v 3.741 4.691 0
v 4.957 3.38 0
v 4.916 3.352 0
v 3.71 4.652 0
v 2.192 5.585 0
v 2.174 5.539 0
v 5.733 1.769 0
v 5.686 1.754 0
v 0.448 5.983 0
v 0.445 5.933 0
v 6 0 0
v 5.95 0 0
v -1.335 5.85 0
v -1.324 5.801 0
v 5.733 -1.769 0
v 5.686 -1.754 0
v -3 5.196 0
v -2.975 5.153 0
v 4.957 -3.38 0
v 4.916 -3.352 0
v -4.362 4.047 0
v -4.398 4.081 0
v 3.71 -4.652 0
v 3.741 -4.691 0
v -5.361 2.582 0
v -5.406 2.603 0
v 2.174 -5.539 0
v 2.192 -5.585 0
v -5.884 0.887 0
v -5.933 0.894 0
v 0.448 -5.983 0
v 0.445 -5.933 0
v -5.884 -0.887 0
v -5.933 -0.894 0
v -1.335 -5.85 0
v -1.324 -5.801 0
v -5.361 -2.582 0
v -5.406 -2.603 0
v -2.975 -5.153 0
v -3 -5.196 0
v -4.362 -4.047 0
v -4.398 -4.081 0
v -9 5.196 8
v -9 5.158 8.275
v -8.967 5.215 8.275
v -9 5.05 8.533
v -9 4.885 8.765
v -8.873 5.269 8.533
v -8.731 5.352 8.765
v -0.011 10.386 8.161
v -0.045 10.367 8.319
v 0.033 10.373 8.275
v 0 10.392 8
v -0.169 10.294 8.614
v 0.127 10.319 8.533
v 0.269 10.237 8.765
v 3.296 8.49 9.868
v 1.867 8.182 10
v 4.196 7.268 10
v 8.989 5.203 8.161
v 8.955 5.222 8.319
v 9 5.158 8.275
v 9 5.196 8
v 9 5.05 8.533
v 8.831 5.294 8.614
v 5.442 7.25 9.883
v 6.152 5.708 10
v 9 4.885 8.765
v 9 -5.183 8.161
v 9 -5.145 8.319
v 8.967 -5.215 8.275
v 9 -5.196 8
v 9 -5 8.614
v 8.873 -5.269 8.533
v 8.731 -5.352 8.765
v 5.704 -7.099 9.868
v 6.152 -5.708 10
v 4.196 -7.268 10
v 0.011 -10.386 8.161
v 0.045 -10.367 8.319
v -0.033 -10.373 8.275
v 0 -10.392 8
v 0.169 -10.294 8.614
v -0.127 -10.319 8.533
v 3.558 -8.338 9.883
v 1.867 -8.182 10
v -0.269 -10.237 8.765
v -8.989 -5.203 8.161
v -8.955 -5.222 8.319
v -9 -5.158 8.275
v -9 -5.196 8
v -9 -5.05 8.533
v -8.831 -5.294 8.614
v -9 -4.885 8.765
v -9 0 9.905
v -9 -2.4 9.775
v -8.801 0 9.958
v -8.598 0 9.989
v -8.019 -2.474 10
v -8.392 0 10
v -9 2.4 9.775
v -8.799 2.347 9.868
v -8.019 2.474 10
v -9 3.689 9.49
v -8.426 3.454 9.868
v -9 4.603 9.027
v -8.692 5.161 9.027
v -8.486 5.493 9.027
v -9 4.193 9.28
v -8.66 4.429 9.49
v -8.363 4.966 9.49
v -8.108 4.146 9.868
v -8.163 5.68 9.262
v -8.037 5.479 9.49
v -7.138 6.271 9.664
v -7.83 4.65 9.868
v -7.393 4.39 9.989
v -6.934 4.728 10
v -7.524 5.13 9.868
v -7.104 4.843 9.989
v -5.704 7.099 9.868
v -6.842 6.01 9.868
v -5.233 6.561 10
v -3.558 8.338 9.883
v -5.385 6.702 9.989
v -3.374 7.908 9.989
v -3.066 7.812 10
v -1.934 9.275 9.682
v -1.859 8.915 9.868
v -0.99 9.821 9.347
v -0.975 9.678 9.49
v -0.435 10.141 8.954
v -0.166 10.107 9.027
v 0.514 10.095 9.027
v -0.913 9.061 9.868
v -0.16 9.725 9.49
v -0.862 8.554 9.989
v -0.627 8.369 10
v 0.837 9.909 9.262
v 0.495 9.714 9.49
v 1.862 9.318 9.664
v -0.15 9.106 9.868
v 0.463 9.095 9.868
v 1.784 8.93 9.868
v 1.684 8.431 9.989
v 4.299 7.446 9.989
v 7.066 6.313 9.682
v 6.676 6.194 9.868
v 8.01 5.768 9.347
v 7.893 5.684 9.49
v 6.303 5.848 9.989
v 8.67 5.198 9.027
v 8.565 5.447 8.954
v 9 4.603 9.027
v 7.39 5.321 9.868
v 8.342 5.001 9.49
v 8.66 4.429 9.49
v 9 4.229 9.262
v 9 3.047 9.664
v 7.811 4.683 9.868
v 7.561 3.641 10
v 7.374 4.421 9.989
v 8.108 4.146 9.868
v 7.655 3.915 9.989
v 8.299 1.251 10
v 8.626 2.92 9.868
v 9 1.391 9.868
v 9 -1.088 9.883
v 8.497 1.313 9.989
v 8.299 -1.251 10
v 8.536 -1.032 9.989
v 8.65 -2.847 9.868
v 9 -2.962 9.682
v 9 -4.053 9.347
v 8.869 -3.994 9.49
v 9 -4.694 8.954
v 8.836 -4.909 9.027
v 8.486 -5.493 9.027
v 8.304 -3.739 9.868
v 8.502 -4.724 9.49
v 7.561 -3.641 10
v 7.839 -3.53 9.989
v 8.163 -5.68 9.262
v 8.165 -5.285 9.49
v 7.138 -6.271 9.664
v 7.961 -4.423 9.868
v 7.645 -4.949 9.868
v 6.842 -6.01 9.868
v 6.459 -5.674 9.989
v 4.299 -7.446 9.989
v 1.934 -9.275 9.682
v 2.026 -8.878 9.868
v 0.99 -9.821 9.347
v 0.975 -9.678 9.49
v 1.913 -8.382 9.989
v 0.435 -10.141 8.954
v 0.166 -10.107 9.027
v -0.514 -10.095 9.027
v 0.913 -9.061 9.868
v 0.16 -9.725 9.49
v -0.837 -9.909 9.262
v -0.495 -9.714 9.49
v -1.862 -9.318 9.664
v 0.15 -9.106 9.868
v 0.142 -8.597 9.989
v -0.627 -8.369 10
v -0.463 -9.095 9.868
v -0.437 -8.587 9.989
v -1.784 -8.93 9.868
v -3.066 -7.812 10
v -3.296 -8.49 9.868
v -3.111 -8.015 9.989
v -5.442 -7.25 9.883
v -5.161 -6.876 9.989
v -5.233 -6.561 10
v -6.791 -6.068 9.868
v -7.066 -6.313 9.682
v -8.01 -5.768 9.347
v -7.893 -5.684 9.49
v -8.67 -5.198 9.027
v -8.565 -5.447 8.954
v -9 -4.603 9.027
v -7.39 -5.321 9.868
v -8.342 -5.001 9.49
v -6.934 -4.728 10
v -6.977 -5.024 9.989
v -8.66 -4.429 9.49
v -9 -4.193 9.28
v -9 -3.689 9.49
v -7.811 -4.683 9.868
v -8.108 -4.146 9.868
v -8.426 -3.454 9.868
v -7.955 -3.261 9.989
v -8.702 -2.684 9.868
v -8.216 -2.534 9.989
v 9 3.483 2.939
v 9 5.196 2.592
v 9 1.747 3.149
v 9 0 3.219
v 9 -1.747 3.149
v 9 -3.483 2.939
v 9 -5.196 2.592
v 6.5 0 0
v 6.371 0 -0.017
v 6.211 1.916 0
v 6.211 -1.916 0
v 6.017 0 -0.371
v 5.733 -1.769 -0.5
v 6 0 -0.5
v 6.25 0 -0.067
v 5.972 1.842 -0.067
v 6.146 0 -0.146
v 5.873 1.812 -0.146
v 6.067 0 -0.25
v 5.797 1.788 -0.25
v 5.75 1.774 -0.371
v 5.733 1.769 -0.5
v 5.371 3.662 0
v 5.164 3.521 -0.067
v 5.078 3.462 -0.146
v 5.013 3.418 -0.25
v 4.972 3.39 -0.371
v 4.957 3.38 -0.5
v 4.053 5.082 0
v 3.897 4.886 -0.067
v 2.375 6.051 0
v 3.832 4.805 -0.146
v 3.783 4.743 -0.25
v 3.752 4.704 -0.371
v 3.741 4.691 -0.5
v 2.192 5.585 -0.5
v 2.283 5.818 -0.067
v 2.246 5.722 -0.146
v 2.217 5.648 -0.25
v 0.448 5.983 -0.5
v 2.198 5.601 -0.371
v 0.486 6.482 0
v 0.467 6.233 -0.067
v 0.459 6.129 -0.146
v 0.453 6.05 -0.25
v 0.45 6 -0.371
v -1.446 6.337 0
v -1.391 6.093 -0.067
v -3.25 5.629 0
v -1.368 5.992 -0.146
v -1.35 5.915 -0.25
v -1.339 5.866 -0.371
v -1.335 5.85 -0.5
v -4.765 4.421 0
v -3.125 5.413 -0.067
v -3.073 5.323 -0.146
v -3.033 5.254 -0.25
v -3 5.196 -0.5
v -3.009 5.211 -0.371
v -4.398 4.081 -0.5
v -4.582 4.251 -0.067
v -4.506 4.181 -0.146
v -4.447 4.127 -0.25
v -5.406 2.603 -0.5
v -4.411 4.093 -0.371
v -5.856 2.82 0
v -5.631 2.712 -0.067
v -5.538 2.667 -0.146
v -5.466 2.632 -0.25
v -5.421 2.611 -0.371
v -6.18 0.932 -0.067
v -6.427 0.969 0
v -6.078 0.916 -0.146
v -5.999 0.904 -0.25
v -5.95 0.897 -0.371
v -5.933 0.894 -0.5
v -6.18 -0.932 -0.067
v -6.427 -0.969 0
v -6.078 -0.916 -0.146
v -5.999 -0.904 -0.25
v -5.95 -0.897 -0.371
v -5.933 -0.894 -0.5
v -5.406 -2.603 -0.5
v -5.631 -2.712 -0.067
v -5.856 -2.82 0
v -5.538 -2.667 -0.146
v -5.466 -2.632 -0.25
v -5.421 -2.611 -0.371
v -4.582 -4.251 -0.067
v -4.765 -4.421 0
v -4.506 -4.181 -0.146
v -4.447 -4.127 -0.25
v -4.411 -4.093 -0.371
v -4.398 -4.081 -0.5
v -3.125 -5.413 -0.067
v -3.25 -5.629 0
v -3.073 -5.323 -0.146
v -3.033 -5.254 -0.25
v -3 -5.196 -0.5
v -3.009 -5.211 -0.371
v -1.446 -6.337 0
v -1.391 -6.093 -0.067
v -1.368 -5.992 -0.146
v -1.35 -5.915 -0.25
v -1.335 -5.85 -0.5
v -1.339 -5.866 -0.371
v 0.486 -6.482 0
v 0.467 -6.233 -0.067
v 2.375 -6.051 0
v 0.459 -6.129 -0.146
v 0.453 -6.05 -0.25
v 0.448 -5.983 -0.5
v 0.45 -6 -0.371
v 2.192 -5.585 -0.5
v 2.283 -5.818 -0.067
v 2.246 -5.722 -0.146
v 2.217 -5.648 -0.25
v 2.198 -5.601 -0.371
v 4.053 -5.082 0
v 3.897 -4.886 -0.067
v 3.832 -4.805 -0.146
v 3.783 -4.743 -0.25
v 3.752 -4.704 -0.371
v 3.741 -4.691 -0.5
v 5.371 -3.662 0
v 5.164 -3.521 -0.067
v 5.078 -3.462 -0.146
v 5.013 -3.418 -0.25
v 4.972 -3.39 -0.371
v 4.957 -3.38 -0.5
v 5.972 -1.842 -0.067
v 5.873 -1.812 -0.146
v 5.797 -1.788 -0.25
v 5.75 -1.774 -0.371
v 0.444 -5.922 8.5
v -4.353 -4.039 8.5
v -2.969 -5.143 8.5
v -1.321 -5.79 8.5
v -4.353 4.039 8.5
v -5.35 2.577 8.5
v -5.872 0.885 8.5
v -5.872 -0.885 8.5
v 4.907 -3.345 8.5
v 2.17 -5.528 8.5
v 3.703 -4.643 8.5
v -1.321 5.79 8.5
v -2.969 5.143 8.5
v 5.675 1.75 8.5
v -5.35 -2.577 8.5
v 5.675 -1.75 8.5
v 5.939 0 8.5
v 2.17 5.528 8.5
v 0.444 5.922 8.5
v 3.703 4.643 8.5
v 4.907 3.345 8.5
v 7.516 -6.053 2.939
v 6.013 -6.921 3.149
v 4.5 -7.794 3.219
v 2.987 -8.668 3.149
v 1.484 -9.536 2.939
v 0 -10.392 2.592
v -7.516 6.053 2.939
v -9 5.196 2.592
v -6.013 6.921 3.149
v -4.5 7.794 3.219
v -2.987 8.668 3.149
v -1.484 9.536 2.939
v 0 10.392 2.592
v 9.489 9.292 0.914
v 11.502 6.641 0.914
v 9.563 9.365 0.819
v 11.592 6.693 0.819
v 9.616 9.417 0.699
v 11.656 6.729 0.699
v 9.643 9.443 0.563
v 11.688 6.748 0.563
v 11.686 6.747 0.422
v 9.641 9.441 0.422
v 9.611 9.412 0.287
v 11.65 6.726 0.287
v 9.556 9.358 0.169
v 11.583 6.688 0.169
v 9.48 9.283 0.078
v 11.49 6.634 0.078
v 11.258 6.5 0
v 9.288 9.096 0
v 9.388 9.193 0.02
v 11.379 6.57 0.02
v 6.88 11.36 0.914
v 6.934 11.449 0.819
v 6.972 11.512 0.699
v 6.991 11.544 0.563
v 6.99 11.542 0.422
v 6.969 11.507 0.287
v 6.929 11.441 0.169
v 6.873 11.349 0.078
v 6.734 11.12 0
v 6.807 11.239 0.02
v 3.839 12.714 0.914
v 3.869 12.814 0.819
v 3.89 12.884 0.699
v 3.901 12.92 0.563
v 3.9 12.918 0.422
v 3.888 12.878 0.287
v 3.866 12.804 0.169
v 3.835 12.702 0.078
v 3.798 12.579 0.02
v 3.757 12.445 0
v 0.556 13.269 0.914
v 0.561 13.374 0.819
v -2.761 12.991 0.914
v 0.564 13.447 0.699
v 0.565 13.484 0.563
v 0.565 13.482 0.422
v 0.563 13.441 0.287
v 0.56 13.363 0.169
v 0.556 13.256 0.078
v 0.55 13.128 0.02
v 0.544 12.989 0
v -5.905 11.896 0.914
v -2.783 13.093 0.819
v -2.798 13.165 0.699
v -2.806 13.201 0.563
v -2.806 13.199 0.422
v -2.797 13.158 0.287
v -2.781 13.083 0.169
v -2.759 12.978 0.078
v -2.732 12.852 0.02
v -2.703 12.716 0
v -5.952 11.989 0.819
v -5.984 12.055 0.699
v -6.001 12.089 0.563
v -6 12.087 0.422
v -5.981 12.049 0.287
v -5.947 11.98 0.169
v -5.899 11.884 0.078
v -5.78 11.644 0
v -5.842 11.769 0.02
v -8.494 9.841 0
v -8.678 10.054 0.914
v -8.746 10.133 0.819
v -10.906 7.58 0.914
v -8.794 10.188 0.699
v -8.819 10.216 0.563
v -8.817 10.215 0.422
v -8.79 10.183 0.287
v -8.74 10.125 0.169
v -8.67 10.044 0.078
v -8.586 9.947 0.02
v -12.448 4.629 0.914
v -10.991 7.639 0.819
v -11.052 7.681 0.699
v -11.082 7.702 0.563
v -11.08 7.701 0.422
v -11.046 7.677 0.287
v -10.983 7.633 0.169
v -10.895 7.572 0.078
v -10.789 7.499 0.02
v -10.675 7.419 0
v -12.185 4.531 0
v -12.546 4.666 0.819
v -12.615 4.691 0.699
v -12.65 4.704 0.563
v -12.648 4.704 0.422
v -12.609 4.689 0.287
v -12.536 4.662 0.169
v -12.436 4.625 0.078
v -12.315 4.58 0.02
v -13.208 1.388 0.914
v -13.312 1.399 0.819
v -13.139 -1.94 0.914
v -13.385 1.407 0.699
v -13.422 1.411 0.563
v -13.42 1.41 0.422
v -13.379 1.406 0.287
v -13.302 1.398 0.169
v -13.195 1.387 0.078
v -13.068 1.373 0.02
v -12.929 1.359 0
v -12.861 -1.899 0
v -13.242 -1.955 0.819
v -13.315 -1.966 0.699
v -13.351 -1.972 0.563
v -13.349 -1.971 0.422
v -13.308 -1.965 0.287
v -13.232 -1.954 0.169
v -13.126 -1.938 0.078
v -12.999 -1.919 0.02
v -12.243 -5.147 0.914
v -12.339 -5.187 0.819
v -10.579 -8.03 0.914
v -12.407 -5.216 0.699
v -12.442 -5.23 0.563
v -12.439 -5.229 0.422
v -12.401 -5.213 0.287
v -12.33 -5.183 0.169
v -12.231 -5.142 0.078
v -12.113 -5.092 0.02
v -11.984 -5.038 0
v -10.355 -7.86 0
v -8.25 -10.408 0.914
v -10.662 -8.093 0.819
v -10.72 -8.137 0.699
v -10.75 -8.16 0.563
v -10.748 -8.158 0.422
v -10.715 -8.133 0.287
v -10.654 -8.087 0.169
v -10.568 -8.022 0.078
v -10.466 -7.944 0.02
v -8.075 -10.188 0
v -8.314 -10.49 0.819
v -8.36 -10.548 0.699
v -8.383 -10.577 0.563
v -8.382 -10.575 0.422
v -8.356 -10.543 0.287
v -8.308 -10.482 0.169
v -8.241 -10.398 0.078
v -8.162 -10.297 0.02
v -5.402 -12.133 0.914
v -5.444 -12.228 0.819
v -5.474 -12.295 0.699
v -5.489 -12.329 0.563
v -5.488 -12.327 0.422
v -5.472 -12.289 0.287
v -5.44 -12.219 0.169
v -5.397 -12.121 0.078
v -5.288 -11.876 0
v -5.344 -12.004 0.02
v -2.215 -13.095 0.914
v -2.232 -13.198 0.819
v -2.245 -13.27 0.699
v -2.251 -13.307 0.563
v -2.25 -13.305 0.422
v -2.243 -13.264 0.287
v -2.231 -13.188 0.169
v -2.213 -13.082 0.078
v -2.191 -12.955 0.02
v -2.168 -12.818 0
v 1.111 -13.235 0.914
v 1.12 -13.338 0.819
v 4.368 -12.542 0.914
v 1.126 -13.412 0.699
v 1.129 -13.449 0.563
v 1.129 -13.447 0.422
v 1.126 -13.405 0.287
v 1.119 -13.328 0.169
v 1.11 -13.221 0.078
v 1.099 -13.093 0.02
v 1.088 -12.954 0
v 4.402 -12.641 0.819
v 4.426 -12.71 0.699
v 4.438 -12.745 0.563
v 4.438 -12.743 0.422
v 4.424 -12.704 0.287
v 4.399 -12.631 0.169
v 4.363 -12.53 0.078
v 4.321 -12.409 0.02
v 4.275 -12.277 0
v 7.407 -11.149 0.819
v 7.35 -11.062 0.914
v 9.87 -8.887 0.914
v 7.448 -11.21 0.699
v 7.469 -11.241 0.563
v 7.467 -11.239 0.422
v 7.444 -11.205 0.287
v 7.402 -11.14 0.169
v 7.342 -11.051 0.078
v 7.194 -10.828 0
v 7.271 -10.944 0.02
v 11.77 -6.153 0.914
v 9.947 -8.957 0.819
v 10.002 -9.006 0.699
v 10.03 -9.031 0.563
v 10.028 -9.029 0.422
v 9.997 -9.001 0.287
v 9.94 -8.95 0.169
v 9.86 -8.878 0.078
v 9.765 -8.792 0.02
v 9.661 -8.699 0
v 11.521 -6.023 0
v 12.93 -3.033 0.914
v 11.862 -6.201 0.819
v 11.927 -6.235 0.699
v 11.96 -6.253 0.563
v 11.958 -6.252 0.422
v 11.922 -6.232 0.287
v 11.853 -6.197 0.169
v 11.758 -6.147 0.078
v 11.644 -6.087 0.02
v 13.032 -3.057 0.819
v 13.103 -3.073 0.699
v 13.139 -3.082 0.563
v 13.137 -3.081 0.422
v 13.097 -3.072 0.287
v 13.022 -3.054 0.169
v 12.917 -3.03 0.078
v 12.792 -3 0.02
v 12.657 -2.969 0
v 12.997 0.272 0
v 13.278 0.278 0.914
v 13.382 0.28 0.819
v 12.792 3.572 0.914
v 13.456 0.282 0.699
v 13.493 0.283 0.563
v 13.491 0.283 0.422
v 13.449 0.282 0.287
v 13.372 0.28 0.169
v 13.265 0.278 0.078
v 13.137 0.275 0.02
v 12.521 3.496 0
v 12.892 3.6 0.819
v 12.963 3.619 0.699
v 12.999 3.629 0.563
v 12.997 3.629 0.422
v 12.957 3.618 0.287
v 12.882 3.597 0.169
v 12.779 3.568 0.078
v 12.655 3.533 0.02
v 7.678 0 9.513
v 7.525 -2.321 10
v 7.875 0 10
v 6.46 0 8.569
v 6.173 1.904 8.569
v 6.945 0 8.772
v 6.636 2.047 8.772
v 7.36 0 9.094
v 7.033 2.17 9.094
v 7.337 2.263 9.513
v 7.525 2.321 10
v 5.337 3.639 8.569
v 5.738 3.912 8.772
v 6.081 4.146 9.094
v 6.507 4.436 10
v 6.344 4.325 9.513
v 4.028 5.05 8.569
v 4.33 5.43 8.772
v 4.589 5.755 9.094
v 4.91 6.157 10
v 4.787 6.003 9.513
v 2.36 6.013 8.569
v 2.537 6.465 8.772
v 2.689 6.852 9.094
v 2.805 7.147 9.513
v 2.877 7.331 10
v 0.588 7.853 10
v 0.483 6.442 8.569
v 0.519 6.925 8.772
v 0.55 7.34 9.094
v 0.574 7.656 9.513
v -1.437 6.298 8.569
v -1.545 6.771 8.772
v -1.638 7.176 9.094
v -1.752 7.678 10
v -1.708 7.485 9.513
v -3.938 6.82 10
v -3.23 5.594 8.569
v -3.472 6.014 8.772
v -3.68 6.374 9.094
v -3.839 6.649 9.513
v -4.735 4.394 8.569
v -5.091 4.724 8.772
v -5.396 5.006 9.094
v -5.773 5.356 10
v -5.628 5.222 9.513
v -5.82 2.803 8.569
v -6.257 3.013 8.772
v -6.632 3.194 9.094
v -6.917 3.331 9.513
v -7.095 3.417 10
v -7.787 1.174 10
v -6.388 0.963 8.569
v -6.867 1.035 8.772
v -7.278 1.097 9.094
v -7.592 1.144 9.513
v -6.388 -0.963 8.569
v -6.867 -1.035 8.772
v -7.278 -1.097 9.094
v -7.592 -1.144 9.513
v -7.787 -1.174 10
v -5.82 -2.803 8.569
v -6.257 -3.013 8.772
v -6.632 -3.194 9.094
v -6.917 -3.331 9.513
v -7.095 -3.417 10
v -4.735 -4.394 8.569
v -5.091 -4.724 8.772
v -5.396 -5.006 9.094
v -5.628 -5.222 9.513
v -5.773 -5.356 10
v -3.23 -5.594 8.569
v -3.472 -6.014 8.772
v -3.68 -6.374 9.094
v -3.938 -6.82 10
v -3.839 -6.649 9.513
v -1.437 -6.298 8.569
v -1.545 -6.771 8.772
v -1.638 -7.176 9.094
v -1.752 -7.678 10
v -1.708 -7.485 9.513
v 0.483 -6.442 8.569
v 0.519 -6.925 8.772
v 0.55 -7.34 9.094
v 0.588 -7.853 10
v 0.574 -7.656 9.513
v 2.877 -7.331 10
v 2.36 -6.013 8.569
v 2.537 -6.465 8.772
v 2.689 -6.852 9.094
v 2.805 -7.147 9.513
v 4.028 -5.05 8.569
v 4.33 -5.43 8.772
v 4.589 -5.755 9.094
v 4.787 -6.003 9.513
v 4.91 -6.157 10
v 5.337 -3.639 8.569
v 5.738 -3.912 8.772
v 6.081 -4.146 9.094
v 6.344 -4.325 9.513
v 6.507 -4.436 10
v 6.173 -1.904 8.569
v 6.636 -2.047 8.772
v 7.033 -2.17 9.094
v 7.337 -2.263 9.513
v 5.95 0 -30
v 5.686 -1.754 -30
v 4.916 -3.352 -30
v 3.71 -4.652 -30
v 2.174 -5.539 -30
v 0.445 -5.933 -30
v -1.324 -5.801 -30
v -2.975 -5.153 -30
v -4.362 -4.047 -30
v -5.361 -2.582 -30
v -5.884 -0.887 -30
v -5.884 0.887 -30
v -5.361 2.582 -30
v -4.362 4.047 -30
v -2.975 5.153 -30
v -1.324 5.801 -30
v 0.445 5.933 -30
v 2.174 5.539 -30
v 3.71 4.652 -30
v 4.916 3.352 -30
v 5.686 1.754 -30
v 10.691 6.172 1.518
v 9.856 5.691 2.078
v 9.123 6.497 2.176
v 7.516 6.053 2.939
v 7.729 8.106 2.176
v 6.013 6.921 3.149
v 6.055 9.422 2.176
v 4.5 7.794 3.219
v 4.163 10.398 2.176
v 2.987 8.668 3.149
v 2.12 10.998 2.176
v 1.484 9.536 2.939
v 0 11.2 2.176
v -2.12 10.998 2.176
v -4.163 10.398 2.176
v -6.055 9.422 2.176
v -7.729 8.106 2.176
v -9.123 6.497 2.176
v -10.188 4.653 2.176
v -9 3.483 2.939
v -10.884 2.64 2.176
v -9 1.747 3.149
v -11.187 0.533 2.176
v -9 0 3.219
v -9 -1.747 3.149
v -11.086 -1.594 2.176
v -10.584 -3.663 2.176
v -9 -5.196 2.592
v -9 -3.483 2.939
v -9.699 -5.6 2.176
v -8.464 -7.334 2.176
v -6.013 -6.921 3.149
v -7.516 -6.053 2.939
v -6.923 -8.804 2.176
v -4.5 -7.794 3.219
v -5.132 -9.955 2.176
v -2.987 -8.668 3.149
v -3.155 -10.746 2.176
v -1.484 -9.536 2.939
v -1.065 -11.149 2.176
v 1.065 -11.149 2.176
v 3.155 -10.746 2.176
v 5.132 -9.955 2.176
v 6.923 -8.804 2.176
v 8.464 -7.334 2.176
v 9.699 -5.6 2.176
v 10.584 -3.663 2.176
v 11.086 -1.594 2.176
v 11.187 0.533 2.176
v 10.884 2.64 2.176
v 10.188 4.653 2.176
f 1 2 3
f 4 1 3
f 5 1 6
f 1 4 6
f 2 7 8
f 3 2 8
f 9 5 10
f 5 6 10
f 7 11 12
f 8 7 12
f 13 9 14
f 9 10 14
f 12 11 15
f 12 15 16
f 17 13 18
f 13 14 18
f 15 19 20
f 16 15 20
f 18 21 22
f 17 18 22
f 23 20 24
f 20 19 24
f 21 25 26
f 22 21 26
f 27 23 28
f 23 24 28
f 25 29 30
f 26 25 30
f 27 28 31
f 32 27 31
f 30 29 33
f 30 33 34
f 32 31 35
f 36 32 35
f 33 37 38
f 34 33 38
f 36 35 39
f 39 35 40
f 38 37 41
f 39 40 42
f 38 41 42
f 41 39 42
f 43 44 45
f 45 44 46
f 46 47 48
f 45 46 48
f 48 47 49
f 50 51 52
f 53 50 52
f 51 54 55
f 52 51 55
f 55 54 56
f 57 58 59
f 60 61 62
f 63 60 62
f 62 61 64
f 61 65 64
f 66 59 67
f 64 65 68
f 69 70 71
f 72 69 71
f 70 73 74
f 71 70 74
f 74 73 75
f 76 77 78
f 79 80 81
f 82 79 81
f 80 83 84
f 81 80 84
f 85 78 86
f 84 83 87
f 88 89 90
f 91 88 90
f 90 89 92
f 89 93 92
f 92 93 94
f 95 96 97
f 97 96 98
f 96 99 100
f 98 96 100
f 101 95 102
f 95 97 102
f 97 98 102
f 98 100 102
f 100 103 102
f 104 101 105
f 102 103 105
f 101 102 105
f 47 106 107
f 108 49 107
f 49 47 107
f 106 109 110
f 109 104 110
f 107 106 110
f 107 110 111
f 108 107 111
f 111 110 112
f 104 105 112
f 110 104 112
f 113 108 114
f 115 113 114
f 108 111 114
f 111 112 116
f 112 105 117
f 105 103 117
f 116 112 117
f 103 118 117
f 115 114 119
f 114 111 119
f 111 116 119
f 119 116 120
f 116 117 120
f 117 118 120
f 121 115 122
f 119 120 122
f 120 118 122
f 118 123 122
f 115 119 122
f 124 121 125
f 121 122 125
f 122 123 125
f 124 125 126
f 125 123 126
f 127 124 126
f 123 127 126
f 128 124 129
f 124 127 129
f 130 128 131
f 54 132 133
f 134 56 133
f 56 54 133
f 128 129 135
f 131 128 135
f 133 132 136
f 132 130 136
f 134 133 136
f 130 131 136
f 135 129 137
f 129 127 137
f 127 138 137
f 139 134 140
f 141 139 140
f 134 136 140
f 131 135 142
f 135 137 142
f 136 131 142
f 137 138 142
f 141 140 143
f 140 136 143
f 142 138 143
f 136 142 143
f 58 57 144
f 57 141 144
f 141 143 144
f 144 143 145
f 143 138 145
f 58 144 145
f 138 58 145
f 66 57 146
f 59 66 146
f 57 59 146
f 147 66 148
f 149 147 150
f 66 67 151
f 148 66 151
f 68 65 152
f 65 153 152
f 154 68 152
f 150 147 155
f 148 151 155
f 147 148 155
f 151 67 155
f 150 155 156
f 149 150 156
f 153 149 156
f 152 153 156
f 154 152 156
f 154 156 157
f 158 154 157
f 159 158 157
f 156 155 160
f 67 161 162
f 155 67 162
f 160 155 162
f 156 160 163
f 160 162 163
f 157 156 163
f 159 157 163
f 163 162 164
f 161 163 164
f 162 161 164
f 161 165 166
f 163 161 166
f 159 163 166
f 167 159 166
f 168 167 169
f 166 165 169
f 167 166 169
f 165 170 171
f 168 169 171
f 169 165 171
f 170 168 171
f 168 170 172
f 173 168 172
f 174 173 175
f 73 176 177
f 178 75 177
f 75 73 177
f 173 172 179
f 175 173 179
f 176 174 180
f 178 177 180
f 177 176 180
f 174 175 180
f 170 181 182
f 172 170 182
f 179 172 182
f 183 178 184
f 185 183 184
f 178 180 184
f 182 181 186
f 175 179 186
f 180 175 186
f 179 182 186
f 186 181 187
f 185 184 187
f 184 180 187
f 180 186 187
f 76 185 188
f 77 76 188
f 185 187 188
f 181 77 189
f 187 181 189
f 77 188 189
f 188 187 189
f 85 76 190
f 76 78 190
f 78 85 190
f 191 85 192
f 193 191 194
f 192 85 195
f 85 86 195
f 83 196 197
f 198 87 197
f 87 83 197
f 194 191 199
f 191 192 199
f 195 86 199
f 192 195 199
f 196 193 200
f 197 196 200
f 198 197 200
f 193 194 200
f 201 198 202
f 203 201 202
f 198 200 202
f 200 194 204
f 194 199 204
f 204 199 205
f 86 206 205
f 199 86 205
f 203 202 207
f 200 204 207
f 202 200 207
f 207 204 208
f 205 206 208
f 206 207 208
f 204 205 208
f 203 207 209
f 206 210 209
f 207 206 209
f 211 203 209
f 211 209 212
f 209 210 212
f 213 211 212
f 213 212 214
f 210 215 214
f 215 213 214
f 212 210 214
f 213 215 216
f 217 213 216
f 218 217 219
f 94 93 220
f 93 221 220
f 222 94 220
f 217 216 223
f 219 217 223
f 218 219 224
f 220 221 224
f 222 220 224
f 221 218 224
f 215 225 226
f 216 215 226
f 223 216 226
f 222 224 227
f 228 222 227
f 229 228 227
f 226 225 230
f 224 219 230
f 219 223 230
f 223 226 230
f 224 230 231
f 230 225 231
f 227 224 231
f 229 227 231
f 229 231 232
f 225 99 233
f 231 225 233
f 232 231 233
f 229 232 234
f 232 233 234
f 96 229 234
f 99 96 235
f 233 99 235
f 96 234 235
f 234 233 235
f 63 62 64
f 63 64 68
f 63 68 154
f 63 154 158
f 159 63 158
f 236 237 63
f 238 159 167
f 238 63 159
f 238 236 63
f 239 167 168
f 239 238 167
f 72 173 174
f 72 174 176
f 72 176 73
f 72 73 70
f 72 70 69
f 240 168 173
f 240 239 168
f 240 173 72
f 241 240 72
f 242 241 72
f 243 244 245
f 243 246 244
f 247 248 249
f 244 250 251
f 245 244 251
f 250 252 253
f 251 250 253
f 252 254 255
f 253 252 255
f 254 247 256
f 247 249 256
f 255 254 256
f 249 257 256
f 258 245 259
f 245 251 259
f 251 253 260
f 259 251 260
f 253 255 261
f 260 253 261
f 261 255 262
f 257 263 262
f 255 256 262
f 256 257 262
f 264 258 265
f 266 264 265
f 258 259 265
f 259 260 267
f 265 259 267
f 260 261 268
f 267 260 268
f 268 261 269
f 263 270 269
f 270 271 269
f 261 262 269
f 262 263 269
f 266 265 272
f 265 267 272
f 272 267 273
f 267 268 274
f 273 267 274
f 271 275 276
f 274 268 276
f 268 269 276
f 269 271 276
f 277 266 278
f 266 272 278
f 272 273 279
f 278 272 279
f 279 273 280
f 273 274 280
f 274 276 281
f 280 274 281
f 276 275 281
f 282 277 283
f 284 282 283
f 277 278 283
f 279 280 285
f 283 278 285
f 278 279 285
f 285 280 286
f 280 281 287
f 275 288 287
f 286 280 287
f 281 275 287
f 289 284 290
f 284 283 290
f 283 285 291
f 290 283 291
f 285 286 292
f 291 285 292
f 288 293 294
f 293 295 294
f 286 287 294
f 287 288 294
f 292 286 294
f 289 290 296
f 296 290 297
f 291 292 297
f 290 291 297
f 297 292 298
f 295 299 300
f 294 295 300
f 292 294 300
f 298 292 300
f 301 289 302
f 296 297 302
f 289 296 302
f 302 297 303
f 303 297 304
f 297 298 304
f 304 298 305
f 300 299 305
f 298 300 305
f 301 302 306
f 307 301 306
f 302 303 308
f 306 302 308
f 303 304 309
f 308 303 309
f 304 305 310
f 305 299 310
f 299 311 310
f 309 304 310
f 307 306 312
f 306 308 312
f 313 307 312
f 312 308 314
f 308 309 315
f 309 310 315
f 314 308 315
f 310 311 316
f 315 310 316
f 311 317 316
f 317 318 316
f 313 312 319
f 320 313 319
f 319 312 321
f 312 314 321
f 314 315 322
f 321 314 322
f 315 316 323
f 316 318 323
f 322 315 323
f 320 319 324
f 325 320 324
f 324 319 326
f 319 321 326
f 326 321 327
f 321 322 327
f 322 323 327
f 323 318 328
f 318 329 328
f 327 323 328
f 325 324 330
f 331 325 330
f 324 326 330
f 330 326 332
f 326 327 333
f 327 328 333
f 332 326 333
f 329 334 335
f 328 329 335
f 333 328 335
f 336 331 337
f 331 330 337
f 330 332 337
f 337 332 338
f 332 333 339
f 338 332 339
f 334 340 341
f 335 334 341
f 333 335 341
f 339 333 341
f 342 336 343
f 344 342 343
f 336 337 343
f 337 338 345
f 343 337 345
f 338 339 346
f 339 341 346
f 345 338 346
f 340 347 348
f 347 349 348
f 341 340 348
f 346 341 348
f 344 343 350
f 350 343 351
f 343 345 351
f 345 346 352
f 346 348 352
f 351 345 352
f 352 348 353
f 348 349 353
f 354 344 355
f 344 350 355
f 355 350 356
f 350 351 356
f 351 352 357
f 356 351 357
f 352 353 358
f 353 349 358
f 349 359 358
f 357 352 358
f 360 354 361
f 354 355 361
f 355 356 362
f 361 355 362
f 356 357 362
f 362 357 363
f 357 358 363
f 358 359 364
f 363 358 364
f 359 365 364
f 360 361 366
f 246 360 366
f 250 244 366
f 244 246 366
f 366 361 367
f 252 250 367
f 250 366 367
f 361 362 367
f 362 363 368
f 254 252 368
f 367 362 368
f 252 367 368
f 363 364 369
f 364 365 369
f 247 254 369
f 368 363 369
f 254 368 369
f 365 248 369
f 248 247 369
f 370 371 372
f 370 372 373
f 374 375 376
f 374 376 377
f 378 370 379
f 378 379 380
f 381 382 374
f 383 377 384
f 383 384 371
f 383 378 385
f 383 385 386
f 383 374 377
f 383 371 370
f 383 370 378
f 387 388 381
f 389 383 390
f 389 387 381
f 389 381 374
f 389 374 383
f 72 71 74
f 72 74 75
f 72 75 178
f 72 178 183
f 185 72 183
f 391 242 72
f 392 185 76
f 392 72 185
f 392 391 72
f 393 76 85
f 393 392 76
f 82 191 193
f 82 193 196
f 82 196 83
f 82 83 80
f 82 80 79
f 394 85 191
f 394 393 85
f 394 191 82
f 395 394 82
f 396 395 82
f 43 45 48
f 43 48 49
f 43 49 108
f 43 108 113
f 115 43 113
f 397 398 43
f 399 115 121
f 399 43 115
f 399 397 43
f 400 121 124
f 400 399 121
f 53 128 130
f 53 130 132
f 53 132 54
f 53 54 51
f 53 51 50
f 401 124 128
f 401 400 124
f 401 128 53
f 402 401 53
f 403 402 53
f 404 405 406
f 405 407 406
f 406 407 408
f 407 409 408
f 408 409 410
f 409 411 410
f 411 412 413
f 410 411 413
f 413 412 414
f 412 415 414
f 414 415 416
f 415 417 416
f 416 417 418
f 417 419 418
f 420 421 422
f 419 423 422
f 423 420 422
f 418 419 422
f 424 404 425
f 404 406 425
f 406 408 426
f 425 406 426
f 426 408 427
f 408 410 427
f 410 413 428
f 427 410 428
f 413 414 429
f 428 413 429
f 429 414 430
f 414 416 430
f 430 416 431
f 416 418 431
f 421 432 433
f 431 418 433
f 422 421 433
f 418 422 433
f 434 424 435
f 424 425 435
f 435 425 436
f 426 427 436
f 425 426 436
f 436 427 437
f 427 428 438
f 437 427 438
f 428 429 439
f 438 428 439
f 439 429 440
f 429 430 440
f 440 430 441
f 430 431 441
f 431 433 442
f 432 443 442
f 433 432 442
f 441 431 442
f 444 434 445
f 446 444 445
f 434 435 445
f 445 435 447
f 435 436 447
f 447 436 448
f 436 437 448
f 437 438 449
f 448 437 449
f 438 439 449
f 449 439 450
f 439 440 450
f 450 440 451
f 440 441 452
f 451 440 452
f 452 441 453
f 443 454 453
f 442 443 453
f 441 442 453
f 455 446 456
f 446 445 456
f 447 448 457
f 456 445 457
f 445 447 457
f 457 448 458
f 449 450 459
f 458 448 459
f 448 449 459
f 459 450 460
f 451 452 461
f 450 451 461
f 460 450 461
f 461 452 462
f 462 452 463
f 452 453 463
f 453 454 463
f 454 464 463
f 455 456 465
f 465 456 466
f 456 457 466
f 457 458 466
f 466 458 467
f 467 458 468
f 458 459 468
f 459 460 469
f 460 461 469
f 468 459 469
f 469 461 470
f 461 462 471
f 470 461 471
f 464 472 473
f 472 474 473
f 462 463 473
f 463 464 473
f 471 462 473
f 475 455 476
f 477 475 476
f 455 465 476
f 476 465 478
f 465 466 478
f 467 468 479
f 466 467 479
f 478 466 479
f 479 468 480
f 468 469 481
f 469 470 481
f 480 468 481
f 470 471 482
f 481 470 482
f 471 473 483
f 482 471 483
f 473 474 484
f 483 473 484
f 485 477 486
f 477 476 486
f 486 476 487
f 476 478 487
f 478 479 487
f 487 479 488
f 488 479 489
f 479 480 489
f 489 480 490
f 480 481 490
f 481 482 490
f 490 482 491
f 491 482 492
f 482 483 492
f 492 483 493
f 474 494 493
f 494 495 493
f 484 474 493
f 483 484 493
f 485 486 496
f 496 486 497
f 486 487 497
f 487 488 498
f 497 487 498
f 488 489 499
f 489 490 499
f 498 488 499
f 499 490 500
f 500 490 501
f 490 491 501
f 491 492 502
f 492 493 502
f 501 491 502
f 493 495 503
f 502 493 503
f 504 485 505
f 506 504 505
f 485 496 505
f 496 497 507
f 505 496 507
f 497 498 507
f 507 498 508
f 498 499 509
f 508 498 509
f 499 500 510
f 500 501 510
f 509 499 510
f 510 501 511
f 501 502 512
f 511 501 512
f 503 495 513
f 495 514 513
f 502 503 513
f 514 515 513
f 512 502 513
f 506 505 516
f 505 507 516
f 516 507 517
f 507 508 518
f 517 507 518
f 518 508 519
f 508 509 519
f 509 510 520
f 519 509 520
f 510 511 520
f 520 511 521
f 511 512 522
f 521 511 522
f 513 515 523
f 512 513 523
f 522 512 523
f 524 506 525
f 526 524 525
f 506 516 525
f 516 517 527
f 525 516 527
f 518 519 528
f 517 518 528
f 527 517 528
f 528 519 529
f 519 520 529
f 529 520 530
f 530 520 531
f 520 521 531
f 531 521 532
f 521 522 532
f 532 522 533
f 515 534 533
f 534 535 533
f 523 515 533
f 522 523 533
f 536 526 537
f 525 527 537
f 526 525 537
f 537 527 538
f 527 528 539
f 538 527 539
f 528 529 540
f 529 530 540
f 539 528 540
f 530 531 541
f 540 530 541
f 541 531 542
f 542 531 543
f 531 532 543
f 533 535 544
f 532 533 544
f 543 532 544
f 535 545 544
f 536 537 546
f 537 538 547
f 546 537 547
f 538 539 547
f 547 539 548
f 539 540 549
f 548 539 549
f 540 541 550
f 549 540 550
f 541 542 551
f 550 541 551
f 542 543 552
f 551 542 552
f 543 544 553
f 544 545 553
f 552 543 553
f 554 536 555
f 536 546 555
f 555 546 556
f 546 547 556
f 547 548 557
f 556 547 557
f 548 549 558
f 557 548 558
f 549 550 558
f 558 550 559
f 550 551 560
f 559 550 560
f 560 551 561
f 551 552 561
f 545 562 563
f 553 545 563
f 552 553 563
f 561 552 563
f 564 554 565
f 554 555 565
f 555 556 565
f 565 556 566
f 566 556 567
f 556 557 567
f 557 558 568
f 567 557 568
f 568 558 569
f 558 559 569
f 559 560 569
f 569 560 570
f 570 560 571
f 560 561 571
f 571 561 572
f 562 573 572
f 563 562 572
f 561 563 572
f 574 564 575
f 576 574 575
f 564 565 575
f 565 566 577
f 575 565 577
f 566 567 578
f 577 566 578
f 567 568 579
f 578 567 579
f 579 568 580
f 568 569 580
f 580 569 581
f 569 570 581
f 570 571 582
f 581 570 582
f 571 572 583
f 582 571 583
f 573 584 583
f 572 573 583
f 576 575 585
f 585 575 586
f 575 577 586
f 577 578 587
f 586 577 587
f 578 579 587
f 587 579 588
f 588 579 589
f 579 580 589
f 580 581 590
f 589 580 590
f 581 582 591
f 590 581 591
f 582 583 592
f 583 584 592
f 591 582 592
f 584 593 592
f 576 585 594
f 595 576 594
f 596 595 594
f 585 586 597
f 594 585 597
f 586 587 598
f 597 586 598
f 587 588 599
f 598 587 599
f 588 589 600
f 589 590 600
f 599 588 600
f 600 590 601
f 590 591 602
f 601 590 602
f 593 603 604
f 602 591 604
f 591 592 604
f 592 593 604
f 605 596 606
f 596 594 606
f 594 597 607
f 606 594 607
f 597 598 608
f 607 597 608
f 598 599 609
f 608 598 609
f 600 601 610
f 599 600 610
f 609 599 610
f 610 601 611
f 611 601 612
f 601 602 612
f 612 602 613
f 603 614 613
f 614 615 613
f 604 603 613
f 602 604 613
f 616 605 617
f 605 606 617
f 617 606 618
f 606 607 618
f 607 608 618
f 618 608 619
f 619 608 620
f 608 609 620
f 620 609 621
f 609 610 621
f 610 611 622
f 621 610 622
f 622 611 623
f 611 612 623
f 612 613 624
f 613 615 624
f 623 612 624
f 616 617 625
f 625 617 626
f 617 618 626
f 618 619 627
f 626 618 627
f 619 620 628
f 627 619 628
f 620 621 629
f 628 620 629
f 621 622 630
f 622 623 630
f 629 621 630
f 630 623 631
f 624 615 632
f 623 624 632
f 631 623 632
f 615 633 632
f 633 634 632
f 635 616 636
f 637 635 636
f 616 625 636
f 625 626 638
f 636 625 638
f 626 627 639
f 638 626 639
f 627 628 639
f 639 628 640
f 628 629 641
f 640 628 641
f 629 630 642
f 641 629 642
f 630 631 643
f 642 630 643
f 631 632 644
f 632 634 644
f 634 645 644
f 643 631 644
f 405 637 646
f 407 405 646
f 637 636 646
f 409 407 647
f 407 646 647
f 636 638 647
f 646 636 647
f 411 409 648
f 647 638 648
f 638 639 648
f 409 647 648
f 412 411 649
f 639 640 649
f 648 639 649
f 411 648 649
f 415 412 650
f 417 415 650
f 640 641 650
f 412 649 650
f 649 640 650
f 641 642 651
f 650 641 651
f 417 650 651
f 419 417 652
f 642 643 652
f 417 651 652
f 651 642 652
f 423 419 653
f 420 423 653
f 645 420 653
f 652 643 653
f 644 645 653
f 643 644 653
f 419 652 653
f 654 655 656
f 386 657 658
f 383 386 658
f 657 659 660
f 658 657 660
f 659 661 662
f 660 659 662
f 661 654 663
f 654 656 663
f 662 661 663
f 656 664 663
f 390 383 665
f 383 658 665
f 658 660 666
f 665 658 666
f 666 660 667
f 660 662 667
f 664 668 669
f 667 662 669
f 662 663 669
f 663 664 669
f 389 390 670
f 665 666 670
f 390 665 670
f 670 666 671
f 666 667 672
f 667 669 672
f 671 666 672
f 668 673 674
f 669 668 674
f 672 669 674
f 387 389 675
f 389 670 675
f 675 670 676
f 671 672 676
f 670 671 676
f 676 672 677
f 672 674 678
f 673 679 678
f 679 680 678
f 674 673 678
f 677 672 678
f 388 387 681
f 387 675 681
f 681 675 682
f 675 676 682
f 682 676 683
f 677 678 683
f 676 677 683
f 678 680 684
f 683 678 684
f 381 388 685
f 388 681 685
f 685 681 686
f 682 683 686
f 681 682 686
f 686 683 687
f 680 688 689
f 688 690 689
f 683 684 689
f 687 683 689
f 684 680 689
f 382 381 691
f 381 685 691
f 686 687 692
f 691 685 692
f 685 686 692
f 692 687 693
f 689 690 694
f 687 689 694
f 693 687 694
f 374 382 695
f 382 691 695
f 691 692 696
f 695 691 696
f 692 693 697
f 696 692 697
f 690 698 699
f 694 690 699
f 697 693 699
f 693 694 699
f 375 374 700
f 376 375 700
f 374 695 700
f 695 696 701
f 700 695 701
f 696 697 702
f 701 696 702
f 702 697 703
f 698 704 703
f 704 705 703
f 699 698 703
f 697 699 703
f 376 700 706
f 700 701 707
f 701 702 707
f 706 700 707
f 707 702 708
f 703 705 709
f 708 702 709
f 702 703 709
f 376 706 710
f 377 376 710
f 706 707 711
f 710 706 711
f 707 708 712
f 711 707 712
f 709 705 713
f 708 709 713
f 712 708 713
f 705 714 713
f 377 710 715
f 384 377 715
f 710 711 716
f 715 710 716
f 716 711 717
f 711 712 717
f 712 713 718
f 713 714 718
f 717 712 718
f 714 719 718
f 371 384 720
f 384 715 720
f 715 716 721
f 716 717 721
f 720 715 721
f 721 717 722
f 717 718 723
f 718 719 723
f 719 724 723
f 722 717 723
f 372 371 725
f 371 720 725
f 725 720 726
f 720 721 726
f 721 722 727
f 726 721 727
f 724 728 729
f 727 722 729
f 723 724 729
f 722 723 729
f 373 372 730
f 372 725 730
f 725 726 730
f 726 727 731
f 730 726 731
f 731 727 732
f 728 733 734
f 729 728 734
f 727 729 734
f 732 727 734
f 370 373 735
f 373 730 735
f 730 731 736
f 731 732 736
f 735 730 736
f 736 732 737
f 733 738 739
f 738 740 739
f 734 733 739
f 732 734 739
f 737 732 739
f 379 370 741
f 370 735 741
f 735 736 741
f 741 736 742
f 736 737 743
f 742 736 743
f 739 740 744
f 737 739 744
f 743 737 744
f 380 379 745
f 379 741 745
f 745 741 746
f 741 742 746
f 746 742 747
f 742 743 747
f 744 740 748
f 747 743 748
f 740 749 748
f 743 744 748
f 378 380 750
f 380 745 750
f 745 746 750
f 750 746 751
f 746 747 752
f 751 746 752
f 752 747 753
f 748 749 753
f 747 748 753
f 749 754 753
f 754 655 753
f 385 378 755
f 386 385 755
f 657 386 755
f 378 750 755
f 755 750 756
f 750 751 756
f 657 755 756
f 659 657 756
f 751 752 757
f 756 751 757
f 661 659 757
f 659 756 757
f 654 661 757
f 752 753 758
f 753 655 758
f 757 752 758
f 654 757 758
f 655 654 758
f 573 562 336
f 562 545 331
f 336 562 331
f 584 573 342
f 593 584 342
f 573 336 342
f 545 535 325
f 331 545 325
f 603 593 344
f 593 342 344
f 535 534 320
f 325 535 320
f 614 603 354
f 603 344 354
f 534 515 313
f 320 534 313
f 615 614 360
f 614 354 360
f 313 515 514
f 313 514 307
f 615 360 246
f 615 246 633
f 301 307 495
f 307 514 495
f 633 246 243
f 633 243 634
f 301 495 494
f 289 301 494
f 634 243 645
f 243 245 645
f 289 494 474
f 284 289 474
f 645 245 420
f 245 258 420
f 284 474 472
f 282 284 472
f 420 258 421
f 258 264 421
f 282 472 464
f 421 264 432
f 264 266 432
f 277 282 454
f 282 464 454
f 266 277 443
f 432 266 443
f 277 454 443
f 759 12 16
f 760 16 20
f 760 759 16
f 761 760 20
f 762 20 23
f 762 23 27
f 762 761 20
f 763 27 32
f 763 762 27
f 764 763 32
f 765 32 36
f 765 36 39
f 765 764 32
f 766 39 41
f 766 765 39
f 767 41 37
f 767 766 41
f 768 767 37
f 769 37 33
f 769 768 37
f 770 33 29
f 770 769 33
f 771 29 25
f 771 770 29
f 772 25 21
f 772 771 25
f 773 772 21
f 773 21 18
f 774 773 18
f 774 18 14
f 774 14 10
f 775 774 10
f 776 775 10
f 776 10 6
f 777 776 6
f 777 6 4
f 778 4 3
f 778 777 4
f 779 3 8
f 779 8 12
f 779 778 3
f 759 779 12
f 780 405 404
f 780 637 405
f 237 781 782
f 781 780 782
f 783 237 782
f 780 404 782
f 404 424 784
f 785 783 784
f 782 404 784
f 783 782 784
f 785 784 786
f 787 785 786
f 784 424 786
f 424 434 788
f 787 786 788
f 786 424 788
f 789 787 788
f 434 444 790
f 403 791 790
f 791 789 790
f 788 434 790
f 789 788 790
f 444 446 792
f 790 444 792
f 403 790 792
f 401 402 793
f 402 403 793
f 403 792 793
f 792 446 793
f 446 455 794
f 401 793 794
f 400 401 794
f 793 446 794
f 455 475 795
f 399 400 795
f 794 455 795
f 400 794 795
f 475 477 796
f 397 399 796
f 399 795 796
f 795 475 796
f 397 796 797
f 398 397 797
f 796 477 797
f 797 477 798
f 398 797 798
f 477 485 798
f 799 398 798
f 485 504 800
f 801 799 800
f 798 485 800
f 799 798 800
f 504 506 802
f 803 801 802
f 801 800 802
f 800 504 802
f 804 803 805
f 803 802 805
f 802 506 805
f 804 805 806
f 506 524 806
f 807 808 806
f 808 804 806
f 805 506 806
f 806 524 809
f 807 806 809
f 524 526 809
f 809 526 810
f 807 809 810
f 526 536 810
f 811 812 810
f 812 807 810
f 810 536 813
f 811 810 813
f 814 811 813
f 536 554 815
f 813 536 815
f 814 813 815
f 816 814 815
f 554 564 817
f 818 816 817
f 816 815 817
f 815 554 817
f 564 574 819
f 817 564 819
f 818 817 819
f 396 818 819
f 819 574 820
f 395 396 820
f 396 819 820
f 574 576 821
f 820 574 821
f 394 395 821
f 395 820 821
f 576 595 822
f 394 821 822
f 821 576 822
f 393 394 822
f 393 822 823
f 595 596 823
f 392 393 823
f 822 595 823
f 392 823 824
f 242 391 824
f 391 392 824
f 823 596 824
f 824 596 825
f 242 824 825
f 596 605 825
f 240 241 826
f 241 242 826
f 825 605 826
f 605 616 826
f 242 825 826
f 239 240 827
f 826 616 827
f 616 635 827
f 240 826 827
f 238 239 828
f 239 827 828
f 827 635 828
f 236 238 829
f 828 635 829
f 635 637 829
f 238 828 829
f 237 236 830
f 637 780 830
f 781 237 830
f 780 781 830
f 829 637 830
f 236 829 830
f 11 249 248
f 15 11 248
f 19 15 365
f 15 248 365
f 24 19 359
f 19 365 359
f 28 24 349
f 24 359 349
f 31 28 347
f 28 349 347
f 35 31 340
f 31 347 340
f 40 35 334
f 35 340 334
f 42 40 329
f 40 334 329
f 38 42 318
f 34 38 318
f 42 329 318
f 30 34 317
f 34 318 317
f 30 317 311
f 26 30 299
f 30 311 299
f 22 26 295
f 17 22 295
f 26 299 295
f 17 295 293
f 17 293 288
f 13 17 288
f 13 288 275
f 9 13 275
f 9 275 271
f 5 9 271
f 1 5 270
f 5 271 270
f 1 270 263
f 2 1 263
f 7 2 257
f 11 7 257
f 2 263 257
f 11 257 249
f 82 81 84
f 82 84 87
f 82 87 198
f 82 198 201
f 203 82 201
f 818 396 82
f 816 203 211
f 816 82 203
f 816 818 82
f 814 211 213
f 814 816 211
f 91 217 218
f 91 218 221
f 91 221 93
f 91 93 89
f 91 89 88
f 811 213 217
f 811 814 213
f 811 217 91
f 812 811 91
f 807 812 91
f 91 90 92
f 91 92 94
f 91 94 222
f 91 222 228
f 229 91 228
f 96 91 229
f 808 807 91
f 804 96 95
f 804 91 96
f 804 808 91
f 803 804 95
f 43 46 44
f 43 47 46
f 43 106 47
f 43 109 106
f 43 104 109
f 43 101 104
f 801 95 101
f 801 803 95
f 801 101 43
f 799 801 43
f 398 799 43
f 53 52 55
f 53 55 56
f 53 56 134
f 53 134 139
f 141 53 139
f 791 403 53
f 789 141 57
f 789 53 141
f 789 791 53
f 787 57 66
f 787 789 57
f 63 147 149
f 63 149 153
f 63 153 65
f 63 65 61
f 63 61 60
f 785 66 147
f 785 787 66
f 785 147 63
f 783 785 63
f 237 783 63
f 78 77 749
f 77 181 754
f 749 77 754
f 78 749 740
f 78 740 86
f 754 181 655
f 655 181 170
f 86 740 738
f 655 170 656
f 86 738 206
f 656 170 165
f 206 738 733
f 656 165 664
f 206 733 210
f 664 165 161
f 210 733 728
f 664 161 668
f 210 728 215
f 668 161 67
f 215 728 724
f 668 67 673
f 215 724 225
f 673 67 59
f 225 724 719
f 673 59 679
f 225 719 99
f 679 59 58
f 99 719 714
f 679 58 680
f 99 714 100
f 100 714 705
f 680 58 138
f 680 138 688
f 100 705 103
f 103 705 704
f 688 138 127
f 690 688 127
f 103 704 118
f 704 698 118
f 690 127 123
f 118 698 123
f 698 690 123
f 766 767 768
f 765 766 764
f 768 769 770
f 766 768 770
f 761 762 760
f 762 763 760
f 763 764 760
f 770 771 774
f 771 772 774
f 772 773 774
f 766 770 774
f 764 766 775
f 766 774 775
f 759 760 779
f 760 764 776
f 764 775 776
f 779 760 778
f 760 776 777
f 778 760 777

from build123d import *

# Parameters (mm, degrees)
HEAD_DEPTH     = 10
SHANK_SKETCH_R = 6
SHANK_DEPTH    = 30
SKETCH6_R      = 7.875
HEAD_CUT_DEPTH = 1.5
FILLET1_R      = 2
FILLET2_R      = 0.5
THREAD_END_W   = 30
THREAD_END_H   = 0.05


with BuildPart() as part:
    # Head Sketch → Head (new body)
    with BuildSketch(Plane.XY):
        Polygon((0, 10.392304845), (9, 5.196152423), (9, -5.196152423), (0, -10.392304845), (-9, -5.196152423), (-9, 5.196152423), align=None)
    extrude(amount=HEAD_DEPTH)

    # Shank Sketch → Shank (add)
    with BuildSketch(Plane.XY):
        Circle(SHANK_SKETCH_R)
    extrude(amount=-SHANK_DEPTH)

    # Sketch3 → Flange (revolve)
    with BuildSketch(Plane(origin=(0, 0, 0), x_dir=(-1, 0, 0), z_dir=(0, 1, 0)), mode=Mode.PRIVATE) as flange_sk:
        with BuildLine():
            Line((-13, 0), (0, 0))
            Line((0, 0), (0, 5))
            ThreePointArc((0, 5), (-6.947778179, 3.955279081), (-13.281081081, 0.913513514))
            ThreePointArc((-13.281081081, 0.913513514), (-13.477889504, 0.352957076), (-13, 0))
        make_face()
    revolve(flange_sk.sketch.rotate(Axis((0, 0, 0), (0, 0, 1)), 30), axis=Axis((0, 0, 0), (0, 0, 1)))

    # Sketch5 → Head Trim (revolve, cut)
    with BuildSketch(Plane(origin=(0, 0, 0), x_dir=(0, 0, -1), z_dir=(1, 0, 0)), mode=Mode.PRIVATE) as head_trim_sk:
        with BuildLine():
            Line((-10, -8.392304845), (-10, -10.392304845))
            Line((-10, -10.392304845), (-8, -10.392304845))
            ThreePointArc((-8, -10.392304845), (-9.414213562, -9.806518408), (-10, -8.392304845))
        make_face()
    revolve(head_trim_sk.sketch.rotate(Axis((0, 0, 15.085599173), (0, 0, -1)), 90), axis=Axis((0, 0, 15.085599173), (0, 0, -1)), mode=Mode.SUBTRACT)

    # Sketch6 → Head Cut (cut)
    with BuildSketch(Plane.XY.offset(10)):
        Circle(SKETCH6_R)
    extrude(amount=-HEAD_CUT_DEPTH, mode=Mode.SUBTRACT)

    # Fillet1
    # the kernel refuses this fillet: 2 mm, written as the material it adds along each edge
    with BuildSketch(Plane(origin=(0, 0, 8.5), x_dir=(1, 0, 0), z_dir=(0, -1, 0))) as fillet1_piece_1:
        with BuildLine():
            CenterArc((5.938508327, 2), FILLET1_R, 270, 75.522487814)
            Line((5.938508327, 0), (5.938508327, -0.04))
            Line((5.938508327, -0.04), (7.875, -0.04))
            Line((7.875, -0.04), (7.915, 0))
            ThreePointArc((7.915, 0), (7.915, 0.75), (7.913729833, 1.49))
            Line((7.913729833, 1.49), (7.875, 1.5))
        make_face()
    revolve(axis=Axis((0, 0, 8.5), (0, 0, 1)))

    # Fillet2
    fillet2_edges = [part.edges().sort_by_distance(p)[0] for p in [
        (-6, 0, 0),
    ]]
    fillet(fillet2_edges, radius=FILLET2_R)

    # Thread End → Thread Cut (revolve, cut)
    with BuildSketch(Plane(origin=(0, 0, 0), x_dir=(0, 0, -1), z_dir=(1, 0, 0)), mode=Mode.PRIVATE) as thread_cut_sk:
        with Locations((15, 5.975)):
            Rectangle(THREAD_END_W, THREAD_END_H)
    revolve(thread_cut_sk.sketch.rotate(Axis((0, 0, -21.551935625), (0, 0, -1)), 90), axis=Axis((0, 0, -21.551935625), (0, 0, -1)), mode=Mode.SUBTRACT)


solid = part.part
